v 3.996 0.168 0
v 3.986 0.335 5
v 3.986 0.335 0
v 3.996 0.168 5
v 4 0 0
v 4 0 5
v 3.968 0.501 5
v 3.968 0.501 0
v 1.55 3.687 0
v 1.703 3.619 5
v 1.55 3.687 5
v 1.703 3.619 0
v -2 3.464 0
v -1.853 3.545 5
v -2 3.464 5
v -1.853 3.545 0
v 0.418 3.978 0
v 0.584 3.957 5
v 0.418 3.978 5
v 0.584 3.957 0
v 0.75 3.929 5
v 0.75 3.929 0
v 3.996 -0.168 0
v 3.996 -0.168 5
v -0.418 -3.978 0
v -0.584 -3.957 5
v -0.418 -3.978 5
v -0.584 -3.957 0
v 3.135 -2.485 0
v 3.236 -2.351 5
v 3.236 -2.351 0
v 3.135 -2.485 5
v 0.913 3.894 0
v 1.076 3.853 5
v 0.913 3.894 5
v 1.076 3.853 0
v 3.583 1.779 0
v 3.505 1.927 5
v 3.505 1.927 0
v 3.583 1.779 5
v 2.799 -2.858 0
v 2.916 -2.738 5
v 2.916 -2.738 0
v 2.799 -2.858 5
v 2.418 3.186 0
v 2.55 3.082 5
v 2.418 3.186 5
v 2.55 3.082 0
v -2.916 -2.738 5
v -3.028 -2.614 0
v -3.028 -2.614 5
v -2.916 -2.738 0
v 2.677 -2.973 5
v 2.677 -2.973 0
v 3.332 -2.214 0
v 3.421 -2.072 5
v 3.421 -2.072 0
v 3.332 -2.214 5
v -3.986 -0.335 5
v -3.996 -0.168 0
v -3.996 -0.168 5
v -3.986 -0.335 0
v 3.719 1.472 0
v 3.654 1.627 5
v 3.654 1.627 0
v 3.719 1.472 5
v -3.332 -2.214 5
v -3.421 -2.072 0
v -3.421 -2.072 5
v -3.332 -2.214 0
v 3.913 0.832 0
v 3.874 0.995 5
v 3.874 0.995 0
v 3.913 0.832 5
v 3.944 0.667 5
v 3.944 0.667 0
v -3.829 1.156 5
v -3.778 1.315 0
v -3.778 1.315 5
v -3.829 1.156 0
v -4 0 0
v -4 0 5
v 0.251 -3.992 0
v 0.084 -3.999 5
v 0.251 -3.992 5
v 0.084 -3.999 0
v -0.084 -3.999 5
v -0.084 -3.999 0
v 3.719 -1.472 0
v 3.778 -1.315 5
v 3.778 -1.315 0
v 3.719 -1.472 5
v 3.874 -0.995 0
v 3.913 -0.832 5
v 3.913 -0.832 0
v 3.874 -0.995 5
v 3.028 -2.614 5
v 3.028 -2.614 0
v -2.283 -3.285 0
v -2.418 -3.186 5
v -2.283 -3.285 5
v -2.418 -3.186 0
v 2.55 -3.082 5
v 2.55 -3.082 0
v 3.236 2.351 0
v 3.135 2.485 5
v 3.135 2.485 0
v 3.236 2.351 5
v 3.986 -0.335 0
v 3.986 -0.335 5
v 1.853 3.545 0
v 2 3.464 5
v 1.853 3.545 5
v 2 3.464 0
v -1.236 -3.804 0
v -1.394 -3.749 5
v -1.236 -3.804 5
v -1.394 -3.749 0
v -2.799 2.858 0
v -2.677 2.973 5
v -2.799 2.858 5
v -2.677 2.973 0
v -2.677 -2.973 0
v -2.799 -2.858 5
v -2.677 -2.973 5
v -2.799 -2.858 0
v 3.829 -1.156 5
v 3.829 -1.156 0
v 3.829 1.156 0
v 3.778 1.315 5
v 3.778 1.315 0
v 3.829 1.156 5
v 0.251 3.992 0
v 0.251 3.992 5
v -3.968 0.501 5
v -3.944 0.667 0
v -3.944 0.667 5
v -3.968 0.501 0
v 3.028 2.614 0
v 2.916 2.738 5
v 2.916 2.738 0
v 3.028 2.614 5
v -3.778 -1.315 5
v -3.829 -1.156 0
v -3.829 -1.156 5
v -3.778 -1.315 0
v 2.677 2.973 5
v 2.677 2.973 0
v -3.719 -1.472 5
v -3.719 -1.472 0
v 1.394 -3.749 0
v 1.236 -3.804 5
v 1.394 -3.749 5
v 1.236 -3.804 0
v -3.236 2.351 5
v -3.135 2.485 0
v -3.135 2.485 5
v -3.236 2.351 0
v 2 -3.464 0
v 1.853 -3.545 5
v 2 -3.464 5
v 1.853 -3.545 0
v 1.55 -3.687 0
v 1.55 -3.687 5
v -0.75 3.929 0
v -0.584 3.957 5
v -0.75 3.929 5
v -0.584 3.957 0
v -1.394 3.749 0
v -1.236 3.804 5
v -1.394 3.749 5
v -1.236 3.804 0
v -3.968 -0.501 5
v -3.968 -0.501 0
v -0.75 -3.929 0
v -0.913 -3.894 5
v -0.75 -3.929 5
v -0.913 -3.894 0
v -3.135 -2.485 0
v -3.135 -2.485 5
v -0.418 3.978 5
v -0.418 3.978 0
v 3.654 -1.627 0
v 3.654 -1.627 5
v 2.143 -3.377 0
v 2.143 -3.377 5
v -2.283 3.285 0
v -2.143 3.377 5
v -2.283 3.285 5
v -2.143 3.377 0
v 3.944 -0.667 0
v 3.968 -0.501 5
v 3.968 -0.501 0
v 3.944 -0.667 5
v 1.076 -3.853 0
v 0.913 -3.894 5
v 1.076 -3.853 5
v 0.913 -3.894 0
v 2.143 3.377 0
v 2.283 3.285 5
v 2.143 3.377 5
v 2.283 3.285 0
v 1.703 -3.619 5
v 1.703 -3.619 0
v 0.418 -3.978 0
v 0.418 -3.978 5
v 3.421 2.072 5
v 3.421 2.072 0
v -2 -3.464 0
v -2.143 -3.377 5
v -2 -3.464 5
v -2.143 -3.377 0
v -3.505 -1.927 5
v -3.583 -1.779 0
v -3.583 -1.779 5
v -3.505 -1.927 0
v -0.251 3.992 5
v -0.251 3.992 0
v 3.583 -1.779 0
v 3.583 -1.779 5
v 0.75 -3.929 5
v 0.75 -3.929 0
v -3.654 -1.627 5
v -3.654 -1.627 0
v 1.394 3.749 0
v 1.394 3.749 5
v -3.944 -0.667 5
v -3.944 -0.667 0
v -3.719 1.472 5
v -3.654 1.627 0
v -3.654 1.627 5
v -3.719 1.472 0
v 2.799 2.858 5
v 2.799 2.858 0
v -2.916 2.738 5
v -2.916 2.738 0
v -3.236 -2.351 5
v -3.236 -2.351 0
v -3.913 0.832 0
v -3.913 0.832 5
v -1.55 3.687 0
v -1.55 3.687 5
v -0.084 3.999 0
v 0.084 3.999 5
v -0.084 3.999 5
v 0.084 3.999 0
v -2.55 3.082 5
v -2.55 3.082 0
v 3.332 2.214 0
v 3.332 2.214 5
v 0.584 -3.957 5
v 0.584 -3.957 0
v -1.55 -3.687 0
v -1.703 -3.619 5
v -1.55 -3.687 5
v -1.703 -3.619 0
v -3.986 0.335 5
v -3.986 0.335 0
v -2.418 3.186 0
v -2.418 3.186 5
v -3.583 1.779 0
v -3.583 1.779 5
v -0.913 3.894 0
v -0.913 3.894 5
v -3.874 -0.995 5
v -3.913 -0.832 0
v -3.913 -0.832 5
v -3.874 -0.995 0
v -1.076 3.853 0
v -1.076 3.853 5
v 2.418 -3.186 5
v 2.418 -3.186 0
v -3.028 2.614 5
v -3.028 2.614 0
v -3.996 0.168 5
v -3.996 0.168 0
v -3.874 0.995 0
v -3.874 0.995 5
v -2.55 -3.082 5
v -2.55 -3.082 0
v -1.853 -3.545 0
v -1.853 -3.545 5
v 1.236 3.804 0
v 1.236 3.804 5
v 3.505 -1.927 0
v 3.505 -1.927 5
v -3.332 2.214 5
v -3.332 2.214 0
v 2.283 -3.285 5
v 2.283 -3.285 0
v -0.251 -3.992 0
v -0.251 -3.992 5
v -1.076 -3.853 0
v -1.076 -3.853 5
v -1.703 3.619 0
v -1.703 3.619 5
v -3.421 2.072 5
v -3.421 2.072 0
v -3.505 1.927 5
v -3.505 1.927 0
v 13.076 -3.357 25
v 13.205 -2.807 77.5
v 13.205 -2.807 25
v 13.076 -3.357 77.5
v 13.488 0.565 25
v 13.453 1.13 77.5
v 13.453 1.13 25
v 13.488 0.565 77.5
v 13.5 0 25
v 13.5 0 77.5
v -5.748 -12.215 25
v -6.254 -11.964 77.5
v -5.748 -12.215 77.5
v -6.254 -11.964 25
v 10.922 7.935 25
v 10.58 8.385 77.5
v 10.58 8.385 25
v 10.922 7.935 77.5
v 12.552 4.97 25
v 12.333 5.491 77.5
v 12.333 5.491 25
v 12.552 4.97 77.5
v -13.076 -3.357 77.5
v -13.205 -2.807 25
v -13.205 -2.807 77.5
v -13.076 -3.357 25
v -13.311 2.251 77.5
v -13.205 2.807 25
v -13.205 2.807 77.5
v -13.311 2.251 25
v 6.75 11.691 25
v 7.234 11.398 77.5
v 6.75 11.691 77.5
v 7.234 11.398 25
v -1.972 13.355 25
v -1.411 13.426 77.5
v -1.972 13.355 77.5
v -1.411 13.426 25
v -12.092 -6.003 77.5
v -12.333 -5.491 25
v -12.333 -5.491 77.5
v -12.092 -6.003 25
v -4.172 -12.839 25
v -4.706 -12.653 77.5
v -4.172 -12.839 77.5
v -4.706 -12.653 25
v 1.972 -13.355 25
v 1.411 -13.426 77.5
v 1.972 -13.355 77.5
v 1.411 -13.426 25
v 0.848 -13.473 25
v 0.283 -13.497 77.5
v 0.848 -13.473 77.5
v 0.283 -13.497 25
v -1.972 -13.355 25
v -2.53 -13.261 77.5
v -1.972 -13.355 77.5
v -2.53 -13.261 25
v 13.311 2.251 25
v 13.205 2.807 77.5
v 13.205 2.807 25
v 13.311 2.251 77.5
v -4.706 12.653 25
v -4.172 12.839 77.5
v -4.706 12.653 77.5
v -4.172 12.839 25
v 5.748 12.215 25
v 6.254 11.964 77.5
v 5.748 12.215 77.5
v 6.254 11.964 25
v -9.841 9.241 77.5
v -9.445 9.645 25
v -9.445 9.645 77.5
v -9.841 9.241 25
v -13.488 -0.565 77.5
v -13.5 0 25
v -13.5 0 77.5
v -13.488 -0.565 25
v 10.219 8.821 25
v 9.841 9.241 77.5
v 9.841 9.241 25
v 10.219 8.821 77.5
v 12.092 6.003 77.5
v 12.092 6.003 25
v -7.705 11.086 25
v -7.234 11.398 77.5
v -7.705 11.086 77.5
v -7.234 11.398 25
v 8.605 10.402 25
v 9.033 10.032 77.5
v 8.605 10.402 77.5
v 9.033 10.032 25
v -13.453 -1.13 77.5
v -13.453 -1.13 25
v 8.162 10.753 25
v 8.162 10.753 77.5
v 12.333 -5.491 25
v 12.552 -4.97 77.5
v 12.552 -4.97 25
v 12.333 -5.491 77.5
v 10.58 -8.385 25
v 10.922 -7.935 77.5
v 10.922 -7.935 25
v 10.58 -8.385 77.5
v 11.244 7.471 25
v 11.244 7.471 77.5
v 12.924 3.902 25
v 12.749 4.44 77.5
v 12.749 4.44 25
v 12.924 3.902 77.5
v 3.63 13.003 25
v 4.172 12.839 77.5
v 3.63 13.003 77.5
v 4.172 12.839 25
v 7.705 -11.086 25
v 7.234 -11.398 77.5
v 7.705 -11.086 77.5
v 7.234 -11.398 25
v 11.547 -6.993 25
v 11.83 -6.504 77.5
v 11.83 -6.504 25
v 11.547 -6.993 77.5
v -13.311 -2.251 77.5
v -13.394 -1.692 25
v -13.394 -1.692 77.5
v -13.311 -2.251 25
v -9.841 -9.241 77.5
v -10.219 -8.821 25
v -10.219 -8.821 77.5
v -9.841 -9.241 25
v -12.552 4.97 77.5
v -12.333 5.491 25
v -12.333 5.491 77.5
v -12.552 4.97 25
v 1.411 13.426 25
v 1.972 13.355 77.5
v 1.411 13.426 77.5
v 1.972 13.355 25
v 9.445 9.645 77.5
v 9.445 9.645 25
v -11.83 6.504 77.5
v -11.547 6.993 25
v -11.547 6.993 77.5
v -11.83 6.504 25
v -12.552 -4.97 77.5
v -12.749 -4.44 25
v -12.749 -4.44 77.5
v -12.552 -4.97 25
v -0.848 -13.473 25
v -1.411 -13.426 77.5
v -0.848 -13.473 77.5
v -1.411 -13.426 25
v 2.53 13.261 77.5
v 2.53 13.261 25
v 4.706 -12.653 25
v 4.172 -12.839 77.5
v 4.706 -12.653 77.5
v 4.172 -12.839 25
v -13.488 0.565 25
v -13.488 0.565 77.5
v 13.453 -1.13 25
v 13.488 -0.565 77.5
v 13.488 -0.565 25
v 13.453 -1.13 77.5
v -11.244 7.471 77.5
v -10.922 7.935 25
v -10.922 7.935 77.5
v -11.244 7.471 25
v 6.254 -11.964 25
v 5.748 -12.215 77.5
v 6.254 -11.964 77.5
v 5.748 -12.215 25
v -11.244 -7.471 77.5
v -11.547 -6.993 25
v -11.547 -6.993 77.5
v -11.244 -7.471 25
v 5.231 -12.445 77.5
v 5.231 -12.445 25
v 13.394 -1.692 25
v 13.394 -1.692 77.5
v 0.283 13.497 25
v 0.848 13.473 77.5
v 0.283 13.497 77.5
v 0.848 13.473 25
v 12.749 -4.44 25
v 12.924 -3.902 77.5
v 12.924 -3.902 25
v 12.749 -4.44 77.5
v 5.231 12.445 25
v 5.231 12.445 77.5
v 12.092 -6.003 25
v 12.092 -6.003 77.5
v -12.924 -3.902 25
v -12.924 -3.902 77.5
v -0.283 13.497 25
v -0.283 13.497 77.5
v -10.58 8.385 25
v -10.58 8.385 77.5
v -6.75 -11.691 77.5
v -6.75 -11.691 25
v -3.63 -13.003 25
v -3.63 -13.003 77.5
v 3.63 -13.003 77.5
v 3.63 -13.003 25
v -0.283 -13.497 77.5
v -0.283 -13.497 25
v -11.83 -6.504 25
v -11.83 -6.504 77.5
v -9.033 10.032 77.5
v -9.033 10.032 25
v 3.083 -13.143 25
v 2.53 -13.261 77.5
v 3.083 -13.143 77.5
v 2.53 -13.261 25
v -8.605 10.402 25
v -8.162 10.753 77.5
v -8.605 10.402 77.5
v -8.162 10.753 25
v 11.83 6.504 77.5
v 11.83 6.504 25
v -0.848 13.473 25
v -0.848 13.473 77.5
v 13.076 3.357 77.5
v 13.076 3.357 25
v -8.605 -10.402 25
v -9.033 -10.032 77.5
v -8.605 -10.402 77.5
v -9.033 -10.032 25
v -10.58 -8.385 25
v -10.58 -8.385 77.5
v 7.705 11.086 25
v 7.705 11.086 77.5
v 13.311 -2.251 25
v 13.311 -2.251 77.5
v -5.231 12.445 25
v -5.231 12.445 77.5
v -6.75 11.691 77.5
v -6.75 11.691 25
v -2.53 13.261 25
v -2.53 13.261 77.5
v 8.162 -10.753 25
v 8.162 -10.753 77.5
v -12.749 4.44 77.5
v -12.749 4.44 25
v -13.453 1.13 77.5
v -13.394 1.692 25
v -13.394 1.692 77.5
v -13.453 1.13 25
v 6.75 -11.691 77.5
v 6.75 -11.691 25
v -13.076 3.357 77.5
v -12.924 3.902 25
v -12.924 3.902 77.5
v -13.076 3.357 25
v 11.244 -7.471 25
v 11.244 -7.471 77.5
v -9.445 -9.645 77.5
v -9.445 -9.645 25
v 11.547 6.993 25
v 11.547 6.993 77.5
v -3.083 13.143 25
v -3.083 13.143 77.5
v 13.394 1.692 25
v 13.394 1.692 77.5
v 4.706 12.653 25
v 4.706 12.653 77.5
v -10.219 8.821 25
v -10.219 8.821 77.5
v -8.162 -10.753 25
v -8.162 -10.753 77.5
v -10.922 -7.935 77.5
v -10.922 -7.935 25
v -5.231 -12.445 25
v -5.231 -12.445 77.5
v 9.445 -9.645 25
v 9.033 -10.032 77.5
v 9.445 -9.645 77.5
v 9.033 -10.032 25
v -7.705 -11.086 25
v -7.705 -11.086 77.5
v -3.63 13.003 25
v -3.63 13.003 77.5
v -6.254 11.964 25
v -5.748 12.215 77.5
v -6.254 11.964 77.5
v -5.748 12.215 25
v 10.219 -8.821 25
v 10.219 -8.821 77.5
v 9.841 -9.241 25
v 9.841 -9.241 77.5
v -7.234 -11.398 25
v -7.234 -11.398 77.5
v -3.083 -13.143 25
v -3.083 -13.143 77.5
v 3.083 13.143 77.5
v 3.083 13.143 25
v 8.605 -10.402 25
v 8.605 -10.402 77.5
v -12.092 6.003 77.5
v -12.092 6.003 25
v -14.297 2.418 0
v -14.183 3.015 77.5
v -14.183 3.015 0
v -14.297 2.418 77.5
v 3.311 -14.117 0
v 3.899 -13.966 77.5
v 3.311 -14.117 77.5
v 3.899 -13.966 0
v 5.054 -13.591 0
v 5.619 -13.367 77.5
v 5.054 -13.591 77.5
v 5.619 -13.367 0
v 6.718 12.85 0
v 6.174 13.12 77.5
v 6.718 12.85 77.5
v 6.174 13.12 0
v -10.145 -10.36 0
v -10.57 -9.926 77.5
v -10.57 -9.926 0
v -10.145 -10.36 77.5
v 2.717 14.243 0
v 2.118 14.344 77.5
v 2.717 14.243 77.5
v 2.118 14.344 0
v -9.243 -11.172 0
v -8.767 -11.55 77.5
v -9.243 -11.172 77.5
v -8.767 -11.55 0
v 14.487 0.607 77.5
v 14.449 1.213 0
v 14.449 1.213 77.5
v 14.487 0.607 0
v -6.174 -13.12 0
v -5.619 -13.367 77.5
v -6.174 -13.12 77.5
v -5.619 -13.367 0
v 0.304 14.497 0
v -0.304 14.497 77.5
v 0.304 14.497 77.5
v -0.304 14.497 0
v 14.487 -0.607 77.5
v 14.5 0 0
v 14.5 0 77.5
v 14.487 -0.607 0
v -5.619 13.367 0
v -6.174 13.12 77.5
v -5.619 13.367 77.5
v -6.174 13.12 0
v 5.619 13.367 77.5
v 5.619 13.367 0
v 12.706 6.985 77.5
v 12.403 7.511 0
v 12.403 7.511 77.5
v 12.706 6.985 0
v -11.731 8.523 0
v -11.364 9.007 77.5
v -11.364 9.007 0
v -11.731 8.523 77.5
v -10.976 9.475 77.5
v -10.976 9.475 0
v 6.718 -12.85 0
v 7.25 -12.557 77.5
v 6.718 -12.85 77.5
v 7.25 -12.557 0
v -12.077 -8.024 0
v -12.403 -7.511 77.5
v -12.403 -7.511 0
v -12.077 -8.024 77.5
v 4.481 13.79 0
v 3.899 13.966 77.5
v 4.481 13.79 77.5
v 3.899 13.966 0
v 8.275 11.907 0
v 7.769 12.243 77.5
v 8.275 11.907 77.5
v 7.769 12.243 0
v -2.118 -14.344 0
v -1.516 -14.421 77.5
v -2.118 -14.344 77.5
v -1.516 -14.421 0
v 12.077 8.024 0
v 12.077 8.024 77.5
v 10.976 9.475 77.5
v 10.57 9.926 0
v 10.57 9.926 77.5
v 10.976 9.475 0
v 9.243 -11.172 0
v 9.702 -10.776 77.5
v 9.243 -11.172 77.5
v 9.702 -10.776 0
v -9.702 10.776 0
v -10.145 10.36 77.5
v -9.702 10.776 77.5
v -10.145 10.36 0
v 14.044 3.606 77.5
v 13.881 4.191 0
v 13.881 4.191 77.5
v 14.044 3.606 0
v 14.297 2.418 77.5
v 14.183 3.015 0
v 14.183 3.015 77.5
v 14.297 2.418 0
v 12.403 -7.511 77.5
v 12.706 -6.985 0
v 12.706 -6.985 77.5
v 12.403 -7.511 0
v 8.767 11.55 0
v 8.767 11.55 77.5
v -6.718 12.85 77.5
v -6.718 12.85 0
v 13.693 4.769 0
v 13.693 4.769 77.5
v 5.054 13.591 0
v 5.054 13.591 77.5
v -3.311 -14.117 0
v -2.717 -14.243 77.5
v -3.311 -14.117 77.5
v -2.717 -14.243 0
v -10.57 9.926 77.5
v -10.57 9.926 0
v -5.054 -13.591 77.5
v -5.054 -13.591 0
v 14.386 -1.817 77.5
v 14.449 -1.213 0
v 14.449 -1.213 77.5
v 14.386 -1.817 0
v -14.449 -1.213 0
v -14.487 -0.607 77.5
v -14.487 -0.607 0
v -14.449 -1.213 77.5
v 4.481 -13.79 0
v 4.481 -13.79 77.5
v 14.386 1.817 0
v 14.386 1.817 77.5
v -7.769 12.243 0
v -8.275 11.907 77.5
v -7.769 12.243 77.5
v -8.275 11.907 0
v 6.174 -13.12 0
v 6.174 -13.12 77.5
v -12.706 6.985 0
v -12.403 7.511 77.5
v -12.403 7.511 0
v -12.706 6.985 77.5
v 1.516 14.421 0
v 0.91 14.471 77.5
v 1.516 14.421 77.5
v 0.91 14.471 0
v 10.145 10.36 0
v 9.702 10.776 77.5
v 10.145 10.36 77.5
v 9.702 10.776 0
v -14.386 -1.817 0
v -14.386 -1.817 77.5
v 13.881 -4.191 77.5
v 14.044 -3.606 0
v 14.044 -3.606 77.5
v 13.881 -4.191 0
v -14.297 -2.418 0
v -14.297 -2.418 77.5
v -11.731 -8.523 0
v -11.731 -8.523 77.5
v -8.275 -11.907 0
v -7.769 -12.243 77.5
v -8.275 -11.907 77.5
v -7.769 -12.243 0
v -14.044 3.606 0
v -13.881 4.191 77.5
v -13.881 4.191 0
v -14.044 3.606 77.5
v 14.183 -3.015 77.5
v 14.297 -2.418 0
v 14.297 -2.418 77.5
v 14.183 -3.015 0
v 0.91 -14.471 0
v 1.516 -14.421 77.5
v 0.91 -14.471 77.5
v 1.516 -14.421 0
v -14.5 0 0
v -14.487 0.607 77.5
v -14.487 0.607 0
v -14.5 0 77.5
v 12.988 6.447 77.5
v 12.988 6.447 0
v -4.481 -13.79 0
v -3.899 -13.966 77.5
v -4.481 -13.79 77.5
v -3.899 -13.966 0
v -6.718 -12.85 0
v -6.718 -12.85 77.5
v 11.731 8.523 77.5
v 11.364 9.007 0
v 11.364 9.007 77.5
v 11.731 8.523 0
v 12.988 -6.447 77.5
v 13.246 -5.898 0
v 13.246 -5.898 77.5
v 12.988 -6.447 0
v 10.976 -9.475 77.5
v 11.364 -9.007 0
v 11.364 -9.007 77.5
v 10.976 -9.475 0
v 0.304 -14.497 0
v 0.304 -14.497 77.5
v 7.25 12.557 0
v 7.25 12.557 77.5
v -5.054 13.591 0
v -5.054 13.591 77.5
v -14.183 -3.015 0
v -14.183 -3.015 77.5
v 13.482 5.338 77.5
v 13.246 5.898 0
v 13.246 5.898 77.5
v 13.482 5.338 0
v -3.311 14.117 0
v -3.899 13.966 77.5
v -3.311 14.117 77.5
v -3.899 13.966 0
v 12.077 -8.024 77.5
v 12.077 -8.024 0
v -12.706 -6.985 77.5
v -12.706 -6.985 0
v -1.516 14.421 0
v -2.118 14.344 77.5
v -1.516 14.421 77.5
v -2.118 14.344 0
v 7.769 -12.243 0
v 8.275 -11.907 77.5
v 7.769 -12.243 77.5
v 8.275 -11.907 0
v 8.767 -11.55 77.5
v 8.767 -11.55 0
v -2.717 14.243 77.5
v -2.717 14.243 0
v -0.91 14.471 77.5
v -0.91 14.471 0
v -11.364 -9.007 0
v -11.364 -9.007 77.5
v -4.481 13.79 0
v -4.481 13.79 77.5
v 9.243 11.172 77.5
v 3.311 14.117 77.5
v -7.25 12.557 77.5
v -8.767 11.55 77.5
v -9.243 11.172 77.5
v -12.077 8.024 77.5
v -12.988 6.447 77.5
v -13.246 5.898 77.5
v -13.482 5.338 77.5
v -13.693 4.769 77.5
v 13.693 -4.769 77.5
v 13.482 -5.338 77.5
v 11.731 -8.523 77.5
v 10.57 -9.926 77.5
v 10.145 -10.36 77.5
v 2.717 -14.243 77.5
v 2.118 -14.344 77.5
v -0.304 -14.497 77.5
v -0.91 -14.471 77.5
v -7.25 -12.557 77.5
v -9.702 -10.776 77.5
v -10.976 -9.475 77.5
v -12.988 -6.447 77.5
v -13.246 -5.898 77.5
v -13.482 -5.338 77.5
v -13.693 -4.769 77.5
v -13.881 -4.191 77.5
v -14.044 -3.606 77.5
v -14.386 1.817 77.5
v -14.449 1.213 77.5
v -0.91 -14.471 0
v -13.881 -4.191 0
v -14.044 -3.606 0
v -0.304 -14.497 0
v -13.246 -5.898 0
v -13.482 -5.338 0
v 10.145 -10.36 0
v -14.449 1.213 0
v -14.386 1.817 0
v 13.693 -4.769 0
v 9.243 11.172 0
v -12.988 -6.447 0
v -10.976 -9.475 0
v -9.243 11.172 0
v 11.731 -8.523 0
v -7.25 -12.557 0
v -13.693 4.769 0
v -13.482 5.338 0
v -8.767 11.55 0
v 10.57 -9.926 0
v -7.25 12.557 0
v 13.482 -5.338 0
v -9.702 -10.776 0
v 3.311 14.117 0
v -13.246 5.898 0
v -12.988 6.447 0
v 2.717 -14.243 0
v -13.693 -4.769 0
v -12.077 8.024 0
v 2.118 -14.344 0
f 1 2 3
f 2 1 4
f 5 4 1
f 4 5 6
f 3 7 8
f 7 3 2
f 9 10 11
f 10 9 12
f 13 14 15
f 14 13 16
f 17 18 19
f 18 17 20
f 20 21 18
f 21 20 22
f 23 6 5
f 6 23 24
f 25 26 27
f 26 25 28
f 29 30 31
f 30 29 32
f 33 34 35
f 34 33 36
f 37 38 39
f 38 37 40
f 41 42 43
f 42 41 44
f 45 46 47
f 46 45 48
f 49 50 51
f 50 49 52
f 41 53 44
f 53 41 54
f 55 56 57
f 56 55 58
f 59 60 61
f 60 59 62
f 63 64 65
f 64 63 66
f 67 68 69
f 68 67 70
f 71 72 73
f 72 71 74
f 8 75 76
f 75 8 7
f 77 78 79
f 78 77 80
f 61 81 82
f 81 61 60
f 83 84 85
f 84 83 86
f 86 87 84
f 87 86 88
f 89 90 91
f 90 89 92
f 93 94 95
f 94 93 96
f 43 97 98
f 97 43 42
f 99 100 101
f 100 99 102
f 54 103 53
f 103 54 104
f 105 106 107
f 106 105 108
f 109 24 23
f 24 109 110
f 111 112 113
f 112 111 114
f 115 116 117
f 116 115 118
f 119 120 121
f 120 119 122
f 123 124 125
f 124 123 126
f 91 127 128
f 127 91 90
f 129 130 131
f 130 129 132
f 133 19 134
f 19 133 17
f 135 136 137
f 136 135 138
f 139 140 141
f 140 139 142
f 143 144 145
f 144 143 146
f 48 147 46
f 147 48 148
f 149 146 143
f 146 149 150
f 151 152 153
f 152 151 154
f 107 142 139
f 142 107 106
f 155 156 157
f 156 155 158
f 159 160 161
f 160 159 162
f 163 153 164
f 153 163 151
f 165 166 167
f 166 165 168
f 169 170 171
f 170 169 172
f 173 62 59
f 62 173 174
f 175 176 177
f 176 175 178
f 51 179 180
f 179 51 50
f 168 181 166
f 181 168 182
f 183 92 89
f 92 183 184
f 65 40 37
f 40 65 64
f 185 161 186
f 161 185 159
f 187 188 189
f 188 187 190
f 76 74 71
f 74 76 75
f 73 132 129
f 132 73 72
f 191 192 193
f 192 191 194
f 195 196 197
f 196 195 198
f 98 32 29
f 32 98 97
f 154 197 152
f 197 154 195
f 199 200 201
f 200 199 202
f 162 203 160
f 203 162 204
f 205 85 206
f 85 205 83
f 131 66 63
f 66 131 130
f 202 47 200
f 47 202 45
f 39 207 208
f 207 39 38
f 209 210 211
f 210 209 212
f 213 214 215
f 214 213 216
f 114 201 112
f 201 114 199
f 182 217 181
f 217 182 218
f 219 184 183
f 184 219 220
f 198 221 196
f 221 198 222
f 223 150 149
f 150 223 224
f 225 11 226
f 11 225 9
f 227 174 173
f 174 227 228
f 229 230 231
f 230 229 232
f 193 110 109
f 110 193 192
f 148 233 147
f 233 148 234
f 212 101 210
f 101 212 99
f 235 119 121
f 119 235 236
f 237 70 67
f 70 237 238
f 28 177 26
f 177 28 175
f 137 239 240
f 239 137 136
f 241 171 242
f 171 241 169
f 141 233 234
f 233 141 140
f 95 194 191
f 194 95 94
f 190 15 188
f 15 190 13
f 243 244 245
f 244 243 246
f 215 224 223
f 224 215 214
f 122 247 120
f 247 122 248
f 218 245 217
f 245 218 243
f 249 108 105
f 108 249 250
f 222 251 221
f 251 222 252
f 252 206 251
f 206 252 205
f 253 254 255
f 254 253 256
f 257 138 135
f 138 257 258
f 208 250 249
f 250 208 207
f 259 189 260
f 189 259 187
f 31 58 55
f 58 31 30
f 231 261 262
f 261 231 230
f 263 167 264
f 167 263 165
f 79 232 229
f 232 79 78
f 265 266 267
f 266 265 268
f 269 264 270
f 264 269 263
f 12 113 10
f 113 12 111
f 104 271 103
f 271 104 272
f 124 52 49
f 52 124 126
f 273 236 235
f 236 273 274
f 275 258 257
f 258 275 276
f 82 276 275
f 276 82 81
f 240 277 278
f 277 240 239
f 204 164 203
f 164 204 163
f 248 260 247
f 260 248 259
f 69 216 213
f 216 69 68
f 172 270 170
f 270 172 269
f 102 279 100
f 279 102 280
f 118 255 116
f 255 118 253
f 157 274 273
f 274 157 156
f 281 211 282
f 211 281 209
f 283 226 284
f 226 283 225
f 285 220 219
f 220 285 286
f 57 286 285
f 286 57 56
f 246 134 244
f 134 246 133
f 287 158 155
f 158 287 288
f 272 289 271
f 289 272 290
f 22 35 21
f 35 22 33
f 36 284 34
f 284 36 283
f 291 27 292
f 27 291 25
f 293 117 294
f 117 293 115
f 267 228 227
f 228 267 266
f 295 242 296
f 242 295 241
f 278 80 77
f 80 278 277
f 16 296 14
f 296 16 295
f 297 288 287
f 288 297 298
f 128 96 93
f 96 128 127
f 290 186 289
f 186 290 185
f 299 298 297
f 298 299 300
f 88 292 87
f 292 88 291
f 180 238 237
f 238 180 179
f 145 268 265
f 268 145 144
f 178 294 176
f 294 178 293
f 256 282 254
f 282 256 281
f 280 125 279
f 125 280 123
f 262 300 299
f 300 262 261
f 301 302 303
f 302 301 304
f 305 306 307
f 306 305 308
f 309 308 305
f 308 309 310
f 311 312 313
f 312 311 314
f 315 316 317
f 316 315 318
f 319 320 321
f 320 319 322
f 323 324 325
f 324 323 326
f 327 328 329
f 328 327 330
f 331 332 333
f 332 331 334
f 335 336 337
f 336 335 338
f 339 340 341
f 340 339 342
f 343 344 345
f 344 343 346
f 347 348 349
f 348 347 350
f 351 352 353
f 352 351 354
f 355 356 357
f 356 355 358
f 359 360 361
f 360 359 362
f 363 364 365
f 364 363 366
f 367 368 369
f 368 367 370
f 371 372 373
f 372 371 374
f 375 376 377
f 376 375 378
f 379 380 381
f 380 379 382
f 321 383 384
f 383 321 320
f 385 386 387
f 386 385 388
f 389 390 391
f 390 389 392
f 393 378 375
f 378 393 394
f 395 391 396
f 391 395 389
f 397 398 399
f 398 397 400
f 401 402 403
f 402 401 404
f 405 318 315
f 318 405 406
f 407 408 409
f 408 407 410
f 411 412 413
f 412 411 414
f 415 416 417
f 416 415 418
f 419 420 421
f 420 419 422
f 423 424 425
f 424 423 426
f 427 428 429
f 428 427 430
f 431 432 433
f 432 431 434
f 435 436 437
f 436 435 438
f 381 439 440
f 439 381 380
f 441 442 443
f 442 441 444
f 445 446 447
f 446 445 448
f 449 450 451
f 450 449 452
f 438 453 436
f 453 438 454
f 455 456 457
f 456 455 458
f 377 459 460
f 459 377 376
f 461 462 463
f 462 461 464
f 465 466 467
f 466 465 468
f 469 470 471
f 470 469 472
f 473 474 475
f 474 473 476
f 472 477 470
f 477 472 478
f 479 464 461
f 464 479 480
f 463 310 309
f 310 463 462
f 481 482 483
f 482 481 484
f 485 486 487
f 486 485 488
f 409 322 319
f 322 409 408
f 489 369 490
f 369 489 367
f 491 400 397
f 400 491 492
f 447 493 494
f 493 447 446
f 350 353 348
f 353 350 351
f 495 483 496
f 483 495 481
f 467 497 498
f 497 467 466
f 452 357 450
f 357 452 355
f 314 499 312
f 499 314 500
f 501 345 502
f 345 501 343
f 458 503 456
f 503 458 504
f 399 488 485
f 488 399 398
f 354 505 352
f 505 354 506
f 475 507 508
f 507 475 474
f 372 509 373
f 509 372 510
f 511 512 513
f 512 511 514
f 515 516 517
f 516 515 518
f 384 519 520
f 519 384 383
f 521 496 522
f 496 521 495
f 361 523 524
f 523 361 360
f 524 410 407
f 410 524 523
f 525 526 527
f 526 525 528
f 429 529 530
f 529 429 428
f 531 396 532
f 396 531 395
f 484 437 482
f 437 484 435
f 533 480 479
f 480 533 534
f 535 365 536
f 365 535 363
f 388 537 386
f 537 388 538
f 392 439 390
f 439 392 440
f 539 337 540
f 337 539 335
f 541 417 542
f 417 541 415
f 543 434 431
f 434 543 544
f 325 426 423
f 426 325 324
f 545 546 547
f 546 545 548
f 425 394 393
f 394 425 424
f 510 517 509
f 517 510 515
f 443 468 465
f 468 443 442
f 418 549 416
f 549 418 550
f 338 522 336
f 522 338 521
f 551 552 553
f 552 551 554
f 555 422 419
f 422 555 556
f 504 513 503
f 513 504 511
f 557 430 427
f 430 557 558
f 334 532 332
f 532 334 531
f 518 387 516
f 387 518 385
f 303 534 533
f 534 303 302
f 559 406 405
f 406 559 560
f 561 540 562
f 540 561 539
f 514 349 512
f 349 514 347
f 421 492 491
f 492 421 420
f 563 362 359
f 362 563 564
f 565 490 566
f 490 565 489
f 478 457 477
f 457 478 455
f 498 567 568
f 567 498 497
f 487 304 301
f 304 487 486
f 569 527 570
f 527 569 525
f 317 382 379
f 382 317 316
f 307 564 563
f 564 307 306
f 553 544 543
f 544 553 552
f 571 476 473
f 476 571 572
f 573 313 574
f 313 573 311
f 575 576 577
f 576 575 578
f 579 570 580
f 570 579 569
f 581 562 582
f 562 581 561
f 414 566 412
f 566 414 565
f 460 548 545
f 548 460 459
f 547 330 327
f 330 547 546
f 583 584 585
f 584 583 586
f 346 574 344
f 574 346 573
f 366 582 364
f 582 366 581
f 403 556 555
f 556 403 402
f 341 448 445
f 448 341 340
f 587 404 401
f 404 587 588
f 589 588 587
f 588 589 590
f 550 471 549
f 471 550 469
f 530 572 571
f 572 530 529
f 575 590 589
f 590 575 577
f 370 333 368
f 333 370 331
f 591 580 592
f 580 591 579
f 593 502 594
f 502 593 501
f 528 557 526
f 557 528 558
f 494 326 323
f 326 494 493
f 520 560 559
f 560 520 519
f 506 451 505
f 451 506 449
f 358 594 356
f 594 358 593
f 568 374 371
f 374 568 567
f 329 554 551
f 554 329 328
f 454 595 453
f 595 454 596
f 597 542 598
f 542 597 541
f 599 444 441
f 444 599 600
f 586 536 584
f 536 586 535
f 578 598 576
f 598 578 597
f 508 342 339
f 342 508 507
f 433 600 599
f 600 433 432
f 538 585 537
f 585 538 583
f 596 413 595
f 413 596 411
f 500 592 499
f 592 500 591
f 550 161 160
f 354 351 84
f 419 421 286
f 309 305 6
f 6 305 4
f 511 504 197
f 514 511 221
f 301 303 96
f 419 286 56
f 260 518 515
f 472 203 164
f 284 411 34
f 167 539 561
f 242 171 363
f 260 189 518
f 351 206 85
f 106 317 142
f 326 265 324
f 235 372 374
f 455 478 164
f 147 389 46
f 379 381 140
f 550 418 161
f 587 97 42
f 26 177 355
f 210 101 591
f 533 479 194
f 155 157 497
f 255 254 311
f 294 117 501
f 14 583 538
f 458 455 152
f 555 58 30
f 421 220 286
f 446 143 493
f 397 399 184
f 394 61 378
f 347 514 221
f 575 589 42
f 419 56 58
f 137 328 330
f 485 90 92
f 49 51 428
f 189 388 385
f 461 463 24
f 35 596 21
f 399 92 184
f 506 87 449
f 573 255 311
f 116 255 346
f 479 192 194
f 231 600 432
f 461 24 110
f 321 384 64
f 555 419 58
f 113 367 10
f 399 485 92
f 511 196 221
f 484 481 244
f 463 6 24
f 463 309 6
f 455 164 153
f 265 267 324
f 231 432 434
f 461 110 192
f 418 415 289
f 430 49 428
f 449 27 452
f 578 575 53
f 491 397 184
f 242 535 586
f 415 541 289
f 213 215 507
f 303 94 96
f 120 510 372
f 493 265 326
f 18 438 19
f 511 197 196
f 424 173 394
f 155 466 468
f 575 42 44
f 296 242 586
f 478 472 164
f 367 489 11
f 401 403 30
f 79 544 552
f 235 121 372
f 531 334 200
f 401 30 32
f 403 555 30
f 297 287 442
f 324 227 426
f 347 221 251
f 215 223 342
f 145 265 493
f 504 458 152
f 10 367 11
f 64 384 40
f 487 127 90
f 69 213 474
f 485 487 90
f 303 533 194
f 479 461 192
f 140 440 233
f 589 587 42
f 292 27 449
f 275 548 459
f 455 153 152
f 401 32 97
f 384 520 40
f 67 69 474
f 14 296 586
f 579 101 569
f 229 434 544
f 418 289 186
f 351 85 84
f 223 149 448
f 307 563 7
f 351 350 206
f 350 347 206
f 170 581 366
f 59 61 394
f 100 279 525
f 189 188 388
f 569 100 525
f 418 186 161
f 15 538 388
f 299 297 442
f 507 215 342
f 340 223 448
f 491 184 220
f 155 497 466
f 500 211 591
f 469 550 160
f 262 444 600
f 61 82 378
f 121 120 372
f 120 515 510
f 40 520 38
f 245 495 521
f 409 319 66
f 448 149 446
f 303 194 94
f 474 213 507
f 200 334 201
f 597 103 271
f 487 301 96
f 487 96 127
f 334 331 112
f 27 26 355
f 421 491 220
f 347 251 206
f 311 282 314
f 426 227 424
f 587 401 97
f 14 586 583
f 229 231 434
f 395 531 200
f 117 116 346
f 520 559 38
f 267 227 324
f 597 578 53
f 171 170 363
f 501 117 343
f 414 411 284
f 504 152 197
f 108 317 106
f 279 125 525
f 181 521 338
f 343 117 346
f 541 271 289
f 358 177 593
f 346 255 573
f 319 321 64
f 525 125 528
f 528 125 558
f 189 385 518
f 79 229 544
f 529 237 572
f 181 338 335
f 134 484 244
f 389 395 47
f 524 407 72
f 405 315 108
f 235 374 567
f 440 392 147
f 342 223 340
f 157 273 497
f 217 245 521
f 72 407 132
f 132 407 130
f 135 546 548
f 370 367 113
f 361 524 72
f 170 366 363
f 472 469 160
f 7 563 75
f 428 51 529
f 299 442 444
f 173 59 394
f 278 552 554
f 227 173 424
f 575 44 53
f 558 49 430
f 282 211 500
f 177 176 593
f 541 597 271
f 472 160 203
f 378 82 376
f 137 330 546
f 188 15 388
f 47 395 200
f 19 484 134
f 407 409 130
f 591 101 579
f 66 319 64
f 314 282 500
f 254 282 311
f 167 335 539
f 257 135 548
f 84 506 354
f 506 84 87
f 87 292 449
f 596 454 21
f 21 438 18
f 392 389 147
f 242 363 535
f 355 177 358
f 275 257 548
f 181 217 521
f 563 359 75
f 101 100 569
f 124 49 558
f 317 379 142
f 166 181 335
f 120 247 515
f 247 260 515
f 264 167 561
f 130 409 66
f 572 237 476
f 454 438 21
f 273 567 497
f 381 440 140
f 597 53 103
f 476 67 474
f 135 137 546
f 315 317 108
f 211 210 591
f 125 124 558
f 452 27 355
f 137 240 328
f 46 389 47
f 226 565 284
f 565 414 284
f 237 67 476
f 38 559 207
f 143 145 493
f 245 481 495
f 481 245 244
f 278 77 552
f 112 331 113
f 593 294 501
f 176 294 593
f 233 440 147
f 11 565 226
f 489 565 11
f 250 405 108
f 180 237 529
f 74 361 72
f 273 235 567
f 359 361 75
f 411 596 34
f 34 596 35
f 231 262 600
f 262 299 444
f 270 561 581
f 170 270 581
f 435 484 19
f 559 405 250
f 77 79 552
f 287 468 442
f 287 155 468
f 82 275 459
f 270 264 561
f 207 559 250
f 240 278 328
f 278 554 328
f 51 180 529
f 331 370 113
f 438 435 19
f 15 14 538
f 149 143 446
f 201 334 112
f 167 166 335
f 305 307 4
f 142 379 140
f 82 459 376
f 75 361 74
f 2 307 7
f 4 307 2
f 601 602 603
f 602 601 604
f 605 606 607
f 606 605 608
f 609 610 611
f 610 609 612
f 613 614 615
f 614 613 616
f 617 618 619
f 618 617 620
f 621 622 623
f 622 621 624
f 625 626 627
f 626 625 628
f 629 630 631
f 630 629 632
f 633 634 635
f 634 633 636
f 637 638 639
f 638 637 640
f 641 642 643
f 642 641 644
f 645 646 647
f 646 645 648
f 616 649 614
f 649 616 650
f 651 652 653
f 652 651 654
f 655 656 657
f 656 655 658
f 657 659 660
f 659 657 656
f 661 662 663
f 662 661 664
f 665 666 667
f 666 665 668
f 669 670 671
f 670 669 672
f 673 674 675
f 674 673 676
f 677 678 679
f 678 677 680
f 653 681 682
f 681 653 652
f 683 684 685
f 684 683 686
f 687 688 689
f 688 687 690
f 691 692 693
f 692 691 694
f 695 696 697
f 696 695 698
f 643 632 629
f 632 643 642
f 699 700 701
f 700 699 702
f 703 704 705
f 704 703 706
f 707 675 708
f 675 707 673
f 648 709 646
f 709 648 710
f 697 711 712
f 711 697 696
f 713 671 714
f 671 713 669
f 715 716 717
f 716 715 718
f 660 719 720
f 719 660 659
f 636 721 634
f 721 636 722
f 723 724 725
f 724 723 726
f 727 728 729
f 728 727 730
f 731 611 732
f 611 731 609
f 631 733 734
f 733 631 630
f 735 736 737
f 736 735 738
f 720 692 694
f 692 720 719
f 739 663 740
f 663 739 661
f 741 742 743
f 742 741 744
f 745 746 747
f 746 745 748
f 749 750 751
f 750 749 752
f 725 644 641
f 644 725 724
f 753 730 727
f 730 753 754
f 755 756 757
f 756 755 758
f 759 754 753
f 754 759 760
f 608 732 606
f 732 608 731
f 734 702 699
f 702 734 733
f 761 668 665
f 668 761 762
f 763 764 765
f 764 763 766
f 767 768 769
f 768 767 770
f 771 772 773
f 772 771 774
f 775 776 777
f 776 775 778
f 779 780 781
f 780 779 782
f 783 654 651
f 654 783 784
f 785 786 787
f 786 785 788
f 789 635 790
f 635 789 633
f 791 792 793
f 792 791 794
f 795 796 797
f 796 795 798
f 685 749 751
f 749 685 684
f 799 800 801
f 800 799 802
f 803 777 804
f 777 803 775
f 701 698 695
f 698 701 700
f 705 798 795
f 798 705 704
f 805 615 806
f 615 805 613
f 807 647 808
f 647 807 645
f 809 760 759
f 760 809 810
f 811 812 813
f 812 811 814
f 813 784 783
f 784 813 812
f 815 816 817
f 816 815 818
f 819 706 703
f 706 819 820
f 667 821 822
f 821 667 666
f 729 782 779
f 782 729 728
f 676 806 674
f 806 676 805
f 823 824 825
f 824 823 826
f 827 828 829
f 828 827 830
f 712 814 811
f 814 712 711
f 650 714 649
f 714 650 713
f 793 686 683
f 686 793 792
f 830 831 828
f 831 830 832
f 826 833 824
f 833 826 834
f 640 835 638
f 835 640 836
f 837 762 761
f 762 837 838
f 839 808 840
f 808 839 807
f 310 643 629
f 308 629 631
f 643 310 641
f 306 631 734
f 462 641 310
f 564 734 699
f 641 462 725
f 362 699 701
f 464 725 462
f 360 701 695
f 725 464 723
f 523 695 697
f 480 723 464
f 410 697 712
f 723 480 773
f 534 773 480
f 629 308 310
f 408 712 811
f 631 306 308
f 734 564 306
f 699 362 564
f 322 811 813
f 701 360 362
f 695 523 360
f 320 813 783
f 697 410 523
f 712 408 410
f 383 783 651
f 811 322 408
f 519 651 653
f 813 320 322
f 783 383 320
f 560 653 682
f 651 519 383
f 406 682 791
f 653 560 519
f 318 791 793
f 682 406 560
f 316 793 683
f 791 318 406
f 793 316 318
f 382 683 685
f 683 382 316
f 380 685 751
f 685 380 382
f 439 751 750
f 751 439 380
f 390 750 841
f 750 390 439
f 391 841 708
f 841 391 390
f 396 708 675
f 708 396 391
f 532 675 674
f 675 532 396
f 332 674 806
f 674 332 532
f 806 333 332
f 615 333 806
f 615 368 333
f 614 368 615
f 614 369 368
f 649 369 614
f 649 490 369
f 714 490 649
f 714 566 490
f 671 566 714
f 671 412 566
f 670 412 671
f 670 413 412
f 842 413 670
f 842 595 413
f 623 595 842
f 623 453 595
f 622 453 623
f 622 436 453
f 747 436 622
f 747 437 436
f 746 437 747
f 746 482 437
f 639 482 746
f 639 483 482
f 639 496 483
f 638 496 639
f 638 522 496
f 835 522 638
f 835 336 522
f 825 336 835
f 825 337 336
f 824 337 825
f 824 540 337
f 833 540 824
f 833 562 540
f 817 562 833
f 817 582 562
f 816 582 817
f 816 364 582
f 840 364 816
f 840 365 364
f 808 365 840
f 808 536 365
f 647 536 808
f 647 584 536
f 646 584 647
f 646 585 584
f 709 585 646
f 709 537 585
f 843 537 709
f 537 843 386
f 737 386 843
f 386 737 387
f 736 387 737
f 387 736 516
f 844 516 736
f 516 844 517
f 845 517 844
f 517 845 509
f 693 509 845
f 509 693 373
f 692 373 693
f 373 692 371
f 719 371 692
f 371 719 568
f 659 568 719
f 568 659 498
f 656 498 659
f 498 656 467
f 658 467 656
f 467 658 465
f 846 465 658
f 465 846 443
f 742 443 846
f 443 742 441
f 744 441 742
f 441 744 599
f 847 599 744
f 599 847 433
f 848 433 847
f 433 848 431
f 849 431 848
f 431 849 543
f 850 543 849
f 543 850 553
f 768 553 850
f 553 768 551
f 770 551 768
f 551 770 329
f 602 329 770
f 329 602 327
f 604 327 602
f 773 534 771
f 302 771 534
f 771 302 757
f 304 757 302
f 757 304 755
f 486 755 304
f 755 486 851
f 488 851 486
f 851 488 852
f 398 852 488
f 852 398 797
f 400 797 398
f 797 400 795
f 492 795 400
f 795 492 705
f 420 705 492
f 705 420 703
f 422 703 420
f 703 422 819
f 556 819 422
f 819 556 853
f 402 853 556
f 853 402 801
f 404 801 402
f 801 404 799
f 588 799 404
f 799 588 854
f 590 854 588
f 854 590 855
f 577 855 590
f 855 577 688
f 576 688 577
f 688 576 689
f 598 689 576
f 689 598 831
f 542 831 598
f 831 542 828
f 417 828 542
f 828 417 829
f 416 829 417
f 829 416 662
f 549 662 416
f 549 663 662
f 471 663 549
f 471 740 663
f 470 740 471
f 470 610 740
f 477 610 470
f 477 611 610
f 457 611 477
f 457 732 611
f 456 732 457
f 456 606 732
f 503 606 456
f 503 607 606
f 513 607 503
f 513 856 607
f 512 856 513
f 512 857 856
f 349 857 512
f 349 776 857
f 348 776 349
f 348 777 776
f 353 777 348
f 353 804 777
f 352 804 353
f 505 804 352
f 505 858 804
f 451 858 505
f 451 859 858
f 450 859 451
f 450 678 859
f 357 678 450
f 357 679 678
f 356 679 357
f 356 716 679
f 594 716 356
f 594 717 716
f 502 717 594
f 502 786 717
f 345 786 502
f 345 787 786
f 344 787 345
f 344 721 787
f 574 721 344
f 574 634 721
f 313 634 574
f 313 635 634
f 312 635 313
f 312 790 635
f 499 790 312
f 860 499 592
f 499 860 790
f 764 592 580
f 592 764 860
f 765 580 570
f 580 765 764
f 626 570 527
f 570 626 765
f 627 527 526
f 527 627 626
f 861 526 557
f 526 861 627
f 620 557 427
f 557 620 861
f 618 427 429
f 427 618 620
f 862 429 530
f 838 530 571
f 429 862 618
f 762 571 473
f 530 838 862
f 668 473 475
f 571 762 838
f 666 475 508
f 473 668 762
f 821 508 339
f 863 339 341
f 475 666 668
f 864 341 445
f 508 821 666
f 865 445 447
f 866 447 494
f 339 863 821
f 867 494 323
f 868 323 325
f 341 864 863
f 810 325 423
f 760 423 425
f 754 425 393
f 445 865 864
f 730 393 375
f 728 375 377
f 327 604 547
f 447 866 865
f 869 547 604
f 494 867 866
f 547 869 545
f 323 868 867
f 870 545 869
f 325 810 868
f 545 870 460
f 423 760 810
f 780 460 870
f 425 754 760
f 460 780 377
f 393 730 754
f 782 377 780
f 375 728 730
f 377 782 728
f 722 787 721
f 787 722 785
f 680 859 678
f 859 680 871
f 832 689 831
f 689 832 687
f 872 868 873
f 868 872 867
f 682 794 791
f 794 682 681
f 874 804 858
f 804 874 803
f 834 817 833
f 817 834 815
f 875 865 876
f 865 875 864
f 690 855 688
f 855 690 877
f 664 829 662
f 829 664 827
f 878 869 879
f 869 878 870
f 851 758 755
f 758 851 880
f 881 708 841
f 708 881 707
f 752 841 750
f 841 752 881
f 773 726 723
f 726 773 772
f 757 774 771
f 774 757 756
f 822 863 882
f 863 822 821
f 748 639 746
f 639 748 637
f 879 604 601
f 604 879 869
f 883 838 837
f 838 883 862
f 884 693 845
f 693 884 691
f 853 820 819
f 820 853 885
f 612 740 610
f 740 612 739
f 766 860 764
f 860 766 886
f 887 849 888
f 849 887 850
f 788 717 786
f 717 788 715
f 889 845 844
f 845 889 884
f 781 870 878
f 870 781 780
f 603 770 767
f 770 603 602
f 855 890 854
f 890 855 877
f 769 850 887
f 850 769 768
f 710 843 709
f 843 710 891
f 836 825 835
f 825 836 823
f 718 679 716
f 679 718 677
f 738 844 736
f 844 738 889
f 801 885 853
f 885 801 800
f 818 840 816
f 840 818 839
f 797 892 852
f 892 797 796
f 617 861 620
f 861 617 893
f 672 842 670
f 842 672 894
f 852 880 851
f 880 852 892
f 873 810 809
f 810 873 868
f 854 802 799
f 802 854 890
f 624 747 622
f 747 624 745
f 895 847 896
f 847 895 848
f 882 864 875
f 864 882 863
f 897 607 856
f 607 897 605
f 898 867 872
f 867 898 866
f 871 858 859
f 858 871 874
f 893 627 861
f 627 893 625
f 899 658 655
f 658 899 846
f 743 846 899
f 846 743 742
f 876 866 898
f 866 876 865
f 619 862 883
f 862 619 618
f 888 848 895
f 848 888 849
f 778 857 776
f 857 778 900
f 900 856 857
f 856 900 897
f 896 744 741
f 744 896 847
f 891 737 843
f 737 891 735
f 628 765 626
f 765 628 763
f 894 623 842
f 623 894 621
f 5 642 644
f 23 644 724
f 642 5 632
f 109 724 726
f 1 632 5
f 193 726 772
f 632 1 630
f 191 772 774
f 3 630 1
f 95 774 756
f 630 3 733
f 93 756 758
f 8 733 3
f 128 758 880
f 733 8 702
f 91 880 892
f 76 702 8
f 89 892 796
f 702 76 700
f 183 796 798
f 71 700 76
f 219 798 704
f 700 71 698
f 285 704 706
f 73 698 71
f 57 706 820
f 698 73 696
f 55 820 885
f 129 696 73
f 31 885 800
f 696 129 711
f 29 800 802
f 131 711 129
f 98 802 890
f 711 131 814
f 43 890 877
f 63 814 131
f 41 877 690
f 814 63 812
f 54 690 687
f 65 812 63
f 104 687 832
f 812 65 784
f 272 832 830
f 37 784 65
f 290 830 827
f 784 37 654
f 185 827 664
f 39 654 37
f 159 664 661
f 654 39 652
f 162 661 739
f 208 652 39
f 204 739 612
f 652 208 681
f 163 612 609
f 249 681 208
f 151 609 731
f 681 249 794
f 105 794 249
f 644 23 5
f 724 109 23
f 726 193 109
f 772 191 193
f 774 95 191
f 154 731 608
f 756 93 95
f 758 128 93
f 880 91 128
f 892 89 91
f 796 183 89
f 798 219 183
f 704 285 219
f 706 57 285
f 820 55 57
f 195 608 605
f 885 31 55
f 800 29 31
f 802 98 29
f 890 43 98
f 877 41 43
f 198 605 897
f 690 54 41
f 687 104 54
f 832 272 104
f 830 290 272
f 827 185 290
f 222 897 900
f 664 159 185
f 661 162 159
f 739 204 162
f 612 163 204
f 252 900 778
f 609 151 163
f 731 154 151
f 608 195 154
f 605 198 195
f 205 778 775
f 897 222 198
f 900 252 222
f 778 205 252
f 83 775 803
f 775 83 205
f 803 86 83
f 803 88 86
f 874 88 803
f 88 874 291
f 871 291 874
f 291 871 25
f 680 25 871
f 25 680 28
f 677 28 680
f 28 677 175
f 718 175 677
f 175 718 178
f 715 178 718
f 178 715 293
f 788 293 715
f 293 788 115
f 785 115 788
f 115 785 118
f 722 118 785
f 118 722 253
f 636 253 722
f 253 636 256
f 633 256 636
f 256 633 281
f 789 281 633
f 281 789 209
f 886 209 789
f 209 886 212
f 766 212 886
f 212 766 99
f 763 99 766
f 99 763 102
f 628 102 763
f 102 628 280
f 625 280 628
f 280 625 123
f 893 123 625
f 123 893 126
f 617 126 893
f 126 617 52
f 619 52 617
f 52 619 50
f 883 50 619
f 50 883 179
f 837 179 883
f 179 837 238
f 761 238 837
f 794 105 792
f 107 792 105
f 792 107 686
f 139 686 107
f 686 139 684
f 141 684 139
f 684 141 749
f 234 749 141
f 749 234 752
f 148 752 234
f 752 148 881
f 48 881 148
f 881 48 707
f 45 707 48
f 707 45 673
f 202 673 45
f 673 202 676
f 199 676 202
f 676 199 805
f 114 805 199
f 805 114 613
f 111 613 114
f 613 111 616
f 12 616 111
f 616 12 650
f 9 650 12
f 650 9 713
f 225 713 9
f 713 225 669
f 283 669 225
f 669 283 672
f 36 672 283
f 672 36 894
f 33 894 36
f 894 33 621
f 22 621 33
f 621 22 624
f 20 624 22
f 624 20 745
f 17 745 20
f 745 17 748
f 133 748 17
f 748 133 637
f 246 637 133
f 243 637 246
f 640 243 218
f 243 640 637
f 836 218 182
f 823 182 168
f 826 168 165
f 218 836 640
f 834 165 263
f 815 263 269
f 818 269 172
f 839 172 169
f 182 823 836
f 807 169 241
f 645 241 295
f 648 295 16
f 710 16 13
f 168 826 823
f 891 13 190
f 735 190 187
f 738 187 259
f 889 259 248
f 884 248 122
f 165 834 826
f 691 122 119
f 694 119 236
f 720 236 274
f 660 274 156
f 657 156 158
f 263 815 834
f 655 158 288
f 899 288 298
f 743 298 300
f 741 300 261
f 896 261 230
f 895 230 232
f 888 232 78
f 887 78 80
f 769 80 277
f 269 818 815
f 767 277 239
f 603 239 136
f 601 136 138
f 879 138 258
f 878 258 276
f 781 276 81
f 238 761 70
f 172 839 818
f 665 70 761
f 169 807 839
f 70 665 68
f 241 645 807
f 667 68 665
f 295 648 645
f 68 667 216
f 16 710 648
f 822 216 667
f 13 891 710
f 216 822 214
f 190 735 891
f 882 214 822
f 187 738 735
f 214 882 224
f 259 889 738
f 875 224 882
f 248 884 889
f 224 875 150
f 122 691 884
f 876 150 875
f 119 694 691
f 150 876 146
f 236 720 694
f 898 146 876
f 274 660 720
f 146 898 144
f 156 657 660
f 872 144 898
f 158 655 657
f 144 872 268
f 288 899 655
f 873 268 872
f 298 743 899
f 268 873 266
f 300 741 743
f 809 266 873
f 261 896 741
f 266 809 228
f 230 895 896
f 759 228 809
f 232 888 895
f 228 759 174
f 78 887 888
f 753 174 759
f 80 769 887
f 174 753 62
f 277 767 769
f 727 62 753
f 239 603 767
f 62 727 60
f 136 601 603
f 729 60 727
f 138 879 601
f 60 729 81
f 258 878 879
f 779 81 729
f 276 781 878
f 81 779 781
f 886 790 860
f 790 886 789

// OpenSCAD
$fn=150;

difference() {
    cylinder(h=77.5,r=29/2);
    union(){
        translate([0,0,-1]) cylinder(h=100,r=8/2);
        translate([0,0,25]) cylinder(h=100,r=27/2);
        translate([0,0,5]) cylinder(h=20,r1=8/2,r2=27/2);
    }
}
